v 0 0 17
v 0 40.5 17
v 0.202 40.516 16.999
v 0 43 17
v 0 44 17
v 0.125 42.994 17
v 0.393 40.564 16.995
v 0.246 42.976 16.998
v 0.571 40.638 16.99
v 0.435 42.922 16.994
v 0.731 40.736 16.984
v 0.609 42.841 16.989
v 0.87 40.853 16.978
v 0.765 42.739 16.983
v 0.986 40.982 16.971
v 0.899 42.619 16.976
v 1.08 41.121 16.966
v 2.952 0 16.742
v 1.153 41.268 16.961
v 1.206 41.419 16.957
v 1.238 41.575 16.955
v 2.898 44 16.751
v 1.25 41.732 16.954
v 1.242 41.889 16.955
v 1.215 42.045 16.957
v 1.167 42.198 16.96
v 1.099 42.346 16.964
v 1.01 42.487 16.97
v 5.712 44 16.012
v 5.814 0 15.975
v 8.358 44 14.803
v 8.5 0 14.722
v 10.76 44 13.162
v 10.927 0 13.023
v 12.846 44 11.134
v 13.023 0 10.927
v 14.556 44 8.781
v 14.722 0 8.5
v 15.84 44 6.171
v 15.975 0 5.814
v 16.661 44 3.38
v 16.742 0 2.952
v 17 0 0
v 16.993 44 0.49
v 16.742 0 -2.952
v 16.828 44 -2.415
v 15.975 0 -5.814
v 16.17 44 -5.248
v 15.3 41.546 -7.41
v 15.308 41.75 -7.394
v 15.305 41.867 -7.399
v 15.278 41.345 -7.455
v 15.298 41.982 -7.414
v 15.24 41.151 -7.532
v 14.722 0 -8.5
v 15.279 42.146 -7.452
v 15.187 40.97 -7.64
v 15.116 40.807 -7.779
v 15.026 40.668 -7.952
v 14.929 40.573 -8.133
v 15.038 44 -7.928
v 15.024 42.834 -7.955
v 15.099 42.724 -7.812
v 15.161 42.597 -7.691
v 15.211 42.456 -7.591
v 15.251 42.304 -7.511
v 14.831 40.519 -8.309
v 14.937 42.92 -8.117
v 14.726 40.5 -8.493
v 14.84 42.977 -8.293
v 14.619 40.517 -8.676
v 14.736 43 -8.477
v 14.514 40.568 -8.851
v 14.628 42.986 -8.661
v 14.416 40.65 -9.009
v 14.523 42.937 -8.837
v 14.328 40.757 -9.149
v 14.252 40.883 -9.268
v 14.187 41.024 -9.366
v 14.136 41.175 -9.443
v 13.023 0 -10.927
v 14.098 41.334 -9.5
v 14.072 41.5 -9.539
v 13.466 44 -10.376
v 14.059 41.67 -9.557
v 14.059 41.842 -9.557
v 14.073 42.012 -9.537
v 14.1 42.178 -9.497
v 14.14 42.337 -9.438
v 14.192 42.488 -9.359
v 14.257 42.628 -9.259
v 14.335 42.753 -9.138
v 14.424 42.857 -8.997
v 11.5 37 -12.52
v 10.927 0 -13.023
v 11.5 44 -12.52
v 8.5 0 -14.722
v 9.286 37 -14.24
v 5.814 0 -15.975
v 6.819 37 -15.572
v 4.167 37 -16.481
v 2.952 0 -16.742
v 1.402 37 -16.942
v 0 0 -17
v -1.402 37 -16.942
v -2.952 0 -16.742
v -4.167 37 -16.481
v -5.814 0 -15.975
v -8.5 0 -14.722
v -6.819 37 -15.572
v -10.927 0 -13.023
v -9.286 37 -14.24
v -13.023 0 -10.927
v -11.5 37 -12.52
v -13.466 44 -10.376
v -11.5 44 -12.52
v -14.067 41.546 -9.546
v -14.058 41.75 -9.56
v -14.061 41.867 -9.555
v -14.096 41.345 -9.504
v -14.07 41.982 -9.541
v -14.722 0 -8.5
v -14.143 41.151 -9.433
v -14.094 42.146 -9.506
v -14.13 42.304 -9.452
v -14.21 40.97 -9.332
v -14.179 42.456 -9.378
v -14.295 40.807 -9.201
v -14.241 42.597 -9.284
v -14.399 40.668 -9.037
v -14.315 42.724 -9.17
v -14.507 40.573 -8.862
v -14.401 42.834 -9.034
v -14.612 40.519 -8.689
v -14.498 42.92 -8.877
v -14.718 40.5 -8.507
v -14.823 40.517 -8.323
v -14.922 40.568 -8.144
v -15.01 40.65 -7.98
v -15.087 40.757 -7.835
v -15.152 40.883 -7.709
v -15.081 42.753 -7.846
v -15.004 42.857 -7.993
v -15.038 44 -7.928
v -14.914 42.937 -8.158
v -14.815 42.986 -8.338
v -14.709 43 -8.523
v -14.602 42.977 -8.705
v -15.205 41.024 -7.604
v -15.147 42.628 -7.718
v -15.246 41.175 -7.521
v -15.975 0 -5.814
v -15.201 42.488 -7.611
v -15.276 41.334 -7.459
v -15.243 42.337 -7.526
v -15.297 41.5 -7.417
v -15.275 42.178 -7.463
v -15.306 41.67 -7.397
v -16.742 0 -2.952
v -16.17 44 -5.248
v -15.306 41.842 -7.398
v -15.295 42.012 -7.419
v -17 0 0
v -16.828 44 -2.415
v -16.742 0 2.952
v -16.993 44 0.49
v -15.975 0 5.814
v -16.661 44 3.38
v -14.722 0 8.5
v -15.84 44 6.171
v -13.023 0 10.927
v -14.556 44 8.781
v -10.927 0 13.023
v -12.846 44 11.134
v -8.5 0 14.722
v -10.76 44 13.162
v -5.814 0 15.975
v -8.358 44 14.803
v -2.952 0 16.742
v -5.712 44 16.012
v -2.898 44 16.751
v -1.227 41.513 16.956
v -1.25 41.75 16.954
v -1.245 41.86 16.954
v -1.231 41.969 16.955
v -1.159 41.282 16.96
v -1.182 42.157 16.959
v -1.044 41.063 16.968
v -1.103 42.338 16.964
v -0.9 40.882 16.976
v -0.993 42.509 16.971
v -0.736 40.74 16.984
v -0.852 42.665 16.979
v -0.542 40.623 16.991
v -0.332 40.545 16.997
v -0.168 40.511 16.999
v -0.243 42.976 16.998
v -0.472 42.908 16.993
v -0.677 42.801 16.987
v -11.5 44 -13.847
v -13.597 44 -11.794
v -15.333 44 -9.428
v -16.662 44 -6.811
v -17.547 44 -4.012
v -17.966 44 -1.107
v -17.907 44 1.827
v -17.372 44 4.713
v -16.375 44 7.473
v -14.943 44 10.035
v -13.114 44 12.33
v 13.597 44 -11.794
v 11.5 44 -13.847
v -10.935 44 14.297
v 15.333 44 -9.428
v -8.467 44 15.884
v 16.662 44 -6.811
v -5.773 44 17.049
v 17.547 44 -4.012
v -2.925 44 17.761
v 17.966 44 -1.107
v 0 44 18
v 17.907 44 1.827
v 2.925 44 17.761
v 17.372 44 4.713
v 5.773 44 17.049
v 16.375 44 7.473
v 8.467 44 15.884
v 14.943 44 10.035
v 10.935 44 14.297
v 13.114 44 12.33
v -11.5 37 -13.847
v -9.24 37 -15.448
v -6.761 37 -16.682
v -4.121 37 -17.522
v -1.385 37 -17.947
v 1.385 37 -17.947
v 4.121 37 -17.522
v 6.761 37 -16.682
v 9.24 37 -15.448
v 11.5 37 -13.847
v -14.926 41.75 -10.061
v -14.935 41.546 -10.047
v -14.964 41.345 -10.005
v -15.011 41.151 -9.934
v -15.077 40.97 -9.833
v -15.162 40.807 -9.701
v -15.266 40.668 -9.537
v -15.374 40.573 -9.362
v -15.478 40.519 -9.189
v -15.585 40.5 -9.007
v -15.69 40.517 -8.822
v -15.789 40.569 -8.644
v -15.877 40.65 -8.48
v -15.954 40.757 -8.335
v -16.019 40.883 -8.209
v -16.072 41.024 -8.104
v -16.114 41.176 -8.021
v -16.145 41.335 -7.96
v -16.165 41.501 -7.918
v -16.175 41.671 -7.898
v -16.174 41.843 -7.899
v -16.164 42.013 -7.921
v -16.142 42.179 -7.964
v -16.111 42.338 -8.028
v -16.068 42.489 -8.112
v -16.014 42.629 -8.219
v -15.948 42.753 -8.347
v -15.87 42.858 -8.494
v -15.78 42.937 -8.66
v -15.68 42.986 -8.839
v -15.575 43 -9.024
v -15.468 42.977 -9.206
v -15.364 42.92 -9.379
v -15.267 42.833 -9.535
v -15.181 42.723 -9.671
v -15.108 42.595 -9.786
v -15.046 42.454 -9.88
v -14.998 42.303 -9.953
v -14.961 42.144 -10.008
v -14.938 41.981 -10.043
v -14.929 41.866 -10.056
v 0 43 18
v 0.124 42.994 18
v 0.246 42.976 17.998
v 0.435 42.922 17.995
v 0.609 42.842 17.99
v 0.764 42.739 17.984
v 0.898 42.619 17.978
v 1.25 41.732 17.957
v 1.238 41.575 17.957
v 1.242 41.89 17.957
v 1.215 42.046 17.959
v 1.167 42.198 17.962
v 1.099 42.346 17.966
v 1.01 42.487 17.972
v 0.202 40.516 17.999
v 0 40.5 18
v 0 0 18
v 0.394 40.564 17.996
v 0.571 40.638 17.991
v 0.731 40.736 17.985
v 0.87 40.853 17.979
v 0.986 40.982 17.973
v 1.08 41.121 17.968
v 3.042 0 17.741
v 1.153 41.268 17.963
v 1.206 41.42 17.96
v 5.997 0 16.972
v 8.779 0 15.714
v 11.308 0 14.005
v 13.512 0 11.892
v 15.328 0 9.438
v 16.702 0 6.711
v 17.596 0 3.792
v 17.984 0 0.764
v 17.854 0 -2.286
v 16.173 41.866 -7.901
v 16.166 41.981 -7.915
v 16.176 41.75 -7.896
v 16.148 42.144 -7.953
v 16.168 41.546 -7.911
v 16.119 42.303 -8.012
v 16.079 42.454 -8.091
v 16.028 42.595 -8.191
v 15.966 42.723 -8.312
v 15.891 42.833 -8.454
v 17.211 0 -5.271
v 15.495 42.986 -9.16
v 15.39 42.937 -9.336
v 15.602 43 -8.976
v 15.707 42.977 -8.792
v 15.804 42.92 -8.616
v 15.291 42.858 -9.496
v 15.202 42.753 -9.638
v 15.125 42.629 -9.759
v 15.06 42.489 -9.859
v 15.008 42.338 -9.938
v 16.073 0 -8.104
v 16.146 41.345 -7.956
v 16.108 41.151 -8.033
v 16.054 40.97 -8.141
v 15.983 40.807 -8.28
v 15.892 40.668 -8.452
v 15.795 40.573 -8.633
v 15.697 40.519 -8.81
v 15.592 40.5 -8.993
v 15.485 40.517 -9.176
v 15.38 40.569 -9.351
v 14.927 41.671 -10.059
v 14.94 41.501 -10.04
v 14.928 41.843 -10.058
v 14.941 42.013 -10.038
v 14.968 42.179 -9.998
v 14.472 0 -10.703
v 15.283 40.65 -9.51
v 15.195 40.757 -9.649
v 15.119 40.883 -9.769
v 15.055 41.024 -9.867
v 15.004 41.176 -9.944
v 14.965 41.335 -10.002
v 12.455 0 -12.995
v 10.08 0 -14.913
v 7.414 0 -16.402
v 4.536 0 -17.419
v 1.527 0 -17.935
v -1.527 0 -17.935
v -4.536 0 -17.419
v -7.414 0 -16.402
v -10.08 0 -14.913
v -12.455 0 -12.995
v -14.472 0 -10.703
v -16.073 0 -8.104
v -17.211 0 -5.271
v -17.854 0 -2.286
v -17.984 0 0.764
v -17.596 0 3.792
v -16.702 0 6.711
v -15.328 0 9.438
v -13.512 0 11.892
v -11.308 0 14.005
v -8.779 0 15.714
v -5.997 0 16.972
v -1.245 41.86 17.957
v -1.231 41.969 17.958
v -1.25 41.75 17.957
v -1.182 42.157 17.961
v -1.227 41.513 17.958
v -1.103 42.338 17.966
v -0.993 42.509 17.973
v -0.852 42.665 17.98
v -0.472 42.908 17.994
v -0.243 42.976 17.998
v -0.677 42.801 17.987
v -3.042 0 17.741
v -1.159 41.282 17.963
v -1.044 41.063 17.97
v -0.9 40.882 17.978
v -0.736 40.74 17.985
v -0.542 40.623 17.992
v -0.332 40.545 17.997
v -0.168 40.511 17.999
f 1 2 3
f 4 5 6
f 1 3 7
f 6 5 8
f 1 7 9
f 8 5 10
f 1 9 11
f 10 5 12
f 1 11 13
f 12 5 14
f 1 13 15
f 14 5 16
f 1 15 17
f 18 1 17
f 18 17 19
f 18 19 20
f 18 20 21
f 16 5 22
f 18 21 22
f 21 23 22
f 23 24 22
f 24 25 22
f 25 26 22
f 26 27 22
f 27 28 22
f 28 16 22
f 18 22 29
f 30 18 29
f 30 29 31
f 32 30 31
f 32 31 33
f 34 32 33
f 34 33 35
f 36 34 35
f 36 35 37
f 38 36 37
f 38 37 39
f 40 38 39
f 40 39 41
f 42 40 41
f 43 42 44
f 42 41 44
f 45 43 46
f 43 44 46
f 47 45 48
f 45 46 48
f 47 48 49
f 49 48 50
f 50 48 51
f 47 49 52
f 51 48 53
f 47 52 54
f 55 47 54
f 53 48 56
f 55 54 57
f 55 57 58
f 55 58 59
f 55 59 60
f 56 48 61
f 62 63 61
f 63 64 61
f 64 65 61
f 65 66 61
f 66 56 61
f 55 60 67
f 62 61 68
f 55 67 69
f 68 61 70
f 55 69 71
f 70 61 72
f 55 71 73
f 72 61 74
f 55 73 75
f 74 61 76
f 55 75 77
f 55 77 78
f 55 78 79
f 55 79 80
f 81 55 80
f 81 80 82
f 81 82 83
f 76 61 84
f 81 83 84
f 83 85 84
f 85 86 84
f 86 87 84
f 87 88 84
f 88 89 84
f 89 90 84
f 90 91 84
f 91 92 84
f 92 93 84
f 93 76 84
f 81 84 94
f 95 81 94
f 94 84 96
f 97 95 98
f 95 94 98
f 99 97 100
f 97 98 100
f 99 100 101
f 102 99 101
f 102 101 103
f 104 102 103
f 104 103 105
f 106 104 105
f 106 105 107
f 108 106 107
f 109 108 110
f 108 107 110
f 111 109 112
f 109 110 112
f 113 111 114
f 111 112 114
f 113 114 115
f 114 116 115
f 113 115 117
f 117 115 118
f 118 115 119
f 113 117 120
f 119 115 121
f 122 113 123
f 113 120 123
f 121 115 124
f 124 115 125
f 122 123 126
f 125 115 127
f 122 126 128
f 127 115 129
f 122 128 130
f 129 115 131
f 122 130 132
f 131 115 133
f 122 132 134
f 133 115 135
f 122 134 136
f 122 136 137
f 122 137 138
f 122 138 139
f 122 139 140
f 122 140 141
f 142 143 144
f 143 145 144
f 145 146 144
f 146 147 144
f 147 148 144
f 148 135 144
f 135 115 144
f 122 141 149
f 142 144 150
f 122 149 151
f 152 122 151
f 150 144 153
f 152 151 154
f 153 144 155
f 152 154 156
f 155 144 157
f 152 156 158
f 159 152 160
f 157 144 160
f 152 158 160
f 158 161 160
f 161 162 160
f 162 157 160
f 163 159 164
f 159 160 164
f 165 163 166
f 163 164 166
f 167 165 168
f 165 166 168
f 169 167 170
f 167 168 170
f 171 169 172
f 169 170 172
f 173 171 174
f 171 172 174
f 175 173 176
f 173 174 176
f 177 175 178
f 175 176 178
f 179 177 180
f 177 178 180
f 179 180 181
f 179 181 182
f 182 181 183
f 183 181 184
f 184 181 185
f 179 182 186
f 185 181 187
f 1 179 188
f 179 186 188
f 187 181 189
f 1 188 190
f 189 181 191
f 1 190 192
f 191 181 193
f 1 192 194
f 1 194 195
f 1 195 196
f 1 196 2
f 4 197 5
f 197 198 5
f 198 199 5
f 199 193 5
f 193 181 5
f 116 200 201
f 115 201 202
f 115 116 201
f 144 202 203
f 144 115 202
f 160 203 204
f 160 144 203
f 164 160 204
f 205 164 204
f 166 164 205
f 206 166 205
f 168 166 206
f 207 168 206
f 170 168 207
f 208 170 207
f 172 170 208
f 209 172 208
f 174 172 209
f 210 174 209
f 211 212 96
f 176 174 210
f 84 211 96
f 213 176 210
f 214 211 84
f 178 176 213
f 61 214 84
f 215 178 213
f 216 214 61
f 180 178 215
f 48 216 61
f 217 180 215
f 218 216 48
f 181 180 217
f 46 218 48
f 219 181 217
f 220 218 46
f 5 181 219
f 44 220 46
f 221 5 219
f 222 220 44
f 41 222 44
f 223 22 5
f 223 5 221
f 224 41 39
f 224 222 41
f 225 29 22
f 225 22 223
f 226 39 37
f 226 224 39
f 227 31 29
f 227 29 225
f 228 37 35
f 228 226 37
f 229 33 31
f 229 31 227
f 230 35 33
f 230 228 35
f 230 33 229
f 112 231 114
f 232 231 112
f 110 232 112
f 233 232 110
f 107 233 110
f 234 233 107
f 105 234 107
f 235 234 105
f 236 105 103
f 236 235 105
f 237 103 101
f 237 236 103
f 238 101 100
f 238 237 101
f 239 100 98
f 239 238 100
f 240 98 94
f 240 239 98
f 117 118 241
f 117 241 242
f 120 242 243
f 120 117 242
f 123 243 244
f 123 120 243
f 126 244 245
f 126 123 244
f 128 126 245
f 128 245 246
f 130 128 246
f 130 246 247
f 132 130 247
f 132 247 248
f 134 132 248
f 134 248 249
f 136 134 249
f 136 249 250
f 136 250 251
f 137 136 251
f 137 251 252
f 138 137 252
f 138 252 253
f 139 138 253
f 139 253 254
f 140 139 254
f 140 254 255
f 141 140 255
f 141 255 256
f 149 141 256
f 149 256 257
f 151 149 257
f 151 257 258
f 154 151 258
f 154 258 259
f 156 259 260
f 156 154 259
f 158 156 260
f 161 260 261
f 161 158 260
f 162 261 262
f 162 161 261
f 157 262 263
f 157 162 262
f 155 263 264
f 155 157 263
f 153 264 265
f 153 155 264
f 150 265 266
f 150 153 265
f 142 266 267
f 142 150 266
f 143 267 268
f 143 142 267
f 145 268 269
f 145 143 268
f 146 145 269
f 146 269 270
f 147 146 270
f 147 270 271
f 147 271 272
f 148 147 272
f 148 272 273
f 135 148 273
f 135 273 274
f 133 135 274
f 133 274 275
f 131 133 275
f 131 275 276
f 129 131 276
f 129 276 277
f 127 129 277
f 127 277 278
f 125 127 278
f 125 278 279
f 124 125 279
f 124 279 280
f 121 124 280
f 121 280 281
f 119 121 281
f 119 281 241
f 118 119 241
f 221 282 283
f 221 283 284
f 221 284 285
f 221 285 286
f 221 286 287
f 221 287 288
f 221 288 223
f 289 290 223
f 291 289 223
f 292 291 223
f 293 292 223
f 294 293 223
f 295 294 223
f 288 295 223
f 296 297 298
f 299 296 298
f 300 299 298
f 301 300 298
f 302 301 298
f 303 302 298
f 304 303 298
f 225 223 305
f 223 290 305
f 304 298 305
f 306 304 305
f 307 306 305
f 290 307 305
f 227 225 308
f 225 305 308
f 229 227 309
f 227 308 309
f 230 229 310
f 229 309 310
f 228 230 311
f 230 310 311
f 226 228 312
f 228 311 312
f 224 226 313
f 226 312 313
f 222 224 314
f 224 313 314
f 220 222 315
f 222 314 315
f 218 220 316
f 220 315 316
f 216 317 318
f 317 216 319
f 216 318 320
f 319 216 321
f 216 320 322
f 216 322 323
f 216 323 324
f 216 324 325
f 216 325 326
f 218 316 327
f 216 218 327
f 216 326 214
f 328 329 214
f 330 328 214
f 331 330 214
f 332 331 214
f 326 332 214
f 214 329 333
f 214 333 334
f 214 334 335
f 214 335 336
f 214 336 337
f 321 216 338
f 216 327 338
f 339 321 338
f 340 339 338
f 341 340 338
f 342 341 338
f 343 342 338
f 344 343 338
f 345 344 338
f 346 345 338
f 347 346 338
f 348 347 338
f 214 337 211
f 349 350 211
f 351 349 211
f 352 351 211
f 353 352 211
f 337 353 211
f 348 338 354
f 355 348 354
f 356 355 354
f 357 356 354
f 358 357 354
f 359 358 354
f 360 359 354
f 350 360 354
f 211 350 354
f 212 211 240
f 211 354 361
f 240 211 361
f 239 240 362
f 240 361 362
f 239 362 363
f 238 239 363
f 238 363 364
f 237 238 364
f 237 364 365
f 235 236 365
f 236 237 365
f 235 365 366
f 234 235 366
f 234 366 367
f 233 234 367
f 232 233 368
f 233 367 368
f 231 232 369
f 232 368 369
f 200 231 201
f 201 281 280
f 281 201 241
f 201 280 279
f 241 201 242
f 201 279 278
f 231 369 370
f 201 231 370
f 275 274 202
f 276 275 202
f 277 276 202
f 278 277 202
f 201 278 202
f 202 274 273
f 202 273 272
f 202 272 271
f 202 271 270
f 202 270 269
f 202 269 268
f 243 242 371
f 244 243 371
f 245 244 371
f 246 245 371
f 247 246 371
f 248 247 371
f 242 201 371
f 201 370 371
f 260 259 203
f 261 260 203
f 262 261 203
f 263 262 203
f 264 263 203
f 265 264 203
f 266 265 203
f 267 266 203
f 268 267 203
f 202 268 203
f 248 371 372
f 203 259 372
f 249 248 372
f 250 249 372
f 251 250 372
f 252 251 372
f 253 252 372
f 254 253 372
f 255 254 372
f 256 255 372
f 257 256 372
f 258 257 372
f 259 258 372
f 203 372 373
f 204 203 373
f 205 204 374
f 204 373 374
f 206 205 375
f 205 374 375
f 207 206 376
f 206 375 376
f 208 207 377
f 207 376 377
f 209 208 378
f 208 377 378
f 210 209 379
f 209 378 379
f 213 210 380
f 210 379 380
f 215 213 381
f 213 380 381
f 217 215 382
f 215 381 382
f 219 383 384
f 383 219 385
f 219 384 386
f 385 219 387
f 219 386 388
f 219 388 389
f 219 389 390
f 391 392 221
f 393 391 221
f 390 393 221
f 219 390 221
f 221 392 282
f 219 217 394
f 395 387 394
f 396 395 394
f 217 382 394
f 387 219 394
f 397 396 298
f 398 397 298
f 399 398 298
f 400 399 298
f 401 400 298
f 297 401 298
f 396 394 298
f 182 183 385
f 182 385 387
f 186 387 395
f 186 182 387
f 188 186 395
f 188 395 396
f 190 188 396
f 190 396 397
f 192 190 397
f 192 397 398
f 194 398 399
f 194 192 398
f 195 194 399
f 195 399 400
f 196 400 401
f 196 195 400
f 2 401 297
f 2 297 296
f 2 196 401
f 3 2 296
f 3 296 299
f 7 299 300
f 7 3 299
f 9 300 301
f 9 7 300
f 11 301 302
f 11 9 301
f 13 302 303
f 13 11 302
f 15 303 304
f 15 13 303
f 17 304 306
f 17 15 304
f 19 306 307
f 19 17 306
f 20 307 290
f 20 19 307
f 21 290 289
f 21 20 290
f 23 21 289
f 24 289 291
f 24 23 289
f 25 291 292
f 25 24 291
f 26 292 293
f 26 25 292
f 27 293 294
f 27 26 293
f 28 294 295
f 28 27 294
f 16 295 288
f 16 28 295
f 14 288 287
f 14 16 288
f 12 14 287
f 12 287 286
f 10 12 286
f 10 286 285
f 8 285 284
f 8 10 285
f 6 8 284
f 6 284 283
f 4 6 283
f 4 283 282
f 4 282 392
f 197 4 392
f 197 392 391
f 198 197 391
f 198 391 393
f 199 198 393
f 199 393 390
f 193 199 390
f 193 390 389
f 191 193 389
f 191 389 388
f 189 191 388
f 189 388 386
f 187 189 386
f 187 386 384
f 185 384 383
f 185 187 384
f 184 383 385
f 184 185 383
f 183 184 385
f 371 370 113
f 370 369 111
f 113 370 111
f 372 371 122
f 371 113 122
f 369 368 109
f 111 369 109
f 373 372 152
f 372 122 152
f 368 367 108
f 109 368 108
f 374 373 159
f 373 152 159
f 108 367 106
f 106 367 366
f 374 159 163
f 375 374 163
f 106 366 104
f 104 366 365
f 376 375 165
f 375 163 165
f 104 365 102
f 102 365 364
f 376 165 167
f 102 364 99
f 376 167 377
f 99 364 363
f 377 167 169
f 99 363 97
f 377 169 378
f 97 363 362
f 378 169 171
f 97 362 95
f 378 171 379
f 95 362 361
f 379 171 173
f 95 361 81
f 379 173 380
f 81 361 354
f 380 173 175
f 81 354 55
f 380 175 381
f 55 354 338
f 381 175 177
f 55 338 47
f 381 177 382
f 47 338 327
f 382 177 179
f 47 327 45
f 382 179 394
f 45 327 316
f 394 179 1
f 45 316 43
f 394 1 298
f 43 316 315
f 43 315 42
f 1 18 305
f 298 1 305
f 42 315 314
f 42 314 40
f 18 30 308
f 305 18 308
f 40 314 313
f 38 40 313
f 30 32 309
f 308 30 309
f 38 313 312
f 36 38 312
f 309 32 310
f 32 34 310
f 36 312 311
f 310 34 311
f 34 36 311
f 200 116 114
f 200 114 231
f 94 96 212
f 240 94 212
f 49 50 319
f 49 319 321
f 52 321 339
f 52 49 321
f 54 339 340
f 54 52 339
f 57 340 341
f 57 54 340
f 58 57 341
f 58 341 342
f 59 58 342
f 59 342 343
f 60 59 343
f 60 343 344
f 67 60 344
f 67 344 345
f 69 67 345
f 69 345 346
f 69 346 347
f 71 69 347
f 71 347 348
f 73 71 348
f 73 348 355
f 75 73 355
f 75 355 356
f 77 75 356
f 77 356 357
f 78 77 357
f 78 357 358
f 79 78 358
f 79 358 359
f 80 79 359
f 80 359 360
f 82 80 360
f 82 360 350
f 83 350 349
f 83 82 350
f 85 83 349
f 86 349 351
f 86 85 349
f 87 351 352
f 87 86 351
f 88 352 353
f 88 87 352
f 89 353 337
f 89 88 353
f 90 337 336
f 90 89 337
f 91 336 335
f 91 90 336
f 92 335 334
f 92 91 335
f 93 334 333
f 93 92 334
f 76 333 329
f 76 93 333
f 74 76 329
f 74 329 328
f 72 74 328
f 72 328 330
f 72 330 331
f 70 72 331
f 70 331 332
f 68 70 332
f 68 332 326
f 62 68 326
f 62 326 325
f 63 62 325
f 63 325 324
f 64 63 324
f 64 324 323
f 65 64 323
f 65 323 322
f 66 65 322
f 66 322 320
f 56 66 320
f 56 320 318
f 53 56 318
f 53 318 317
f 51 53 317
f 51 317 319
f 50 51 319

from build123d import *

# Parameters (mm, degrees)
SKETCH1_R           = 18
BOSS_EXTRUDE1_DEPTH = 44
SKETCH3_R           = 17
CUT_EXTRUDE2_DEPTH  = 51.833060109
SKETCH11_W          = 23
SKETCH11_H          = 15.641557415
CUT_EXTRUDE4_DEPTH  = 7
SKETCH13_R          = 1.25
CUT_EXTRUDE5_DEPTH  = 20
CIRPATTERN1_COUNT   = 3


with BuildPart() as part:
    # Sketch1 → Boss-Extrude1 (new body)
    with BuildSketch(Plane(origin=(0, 0, 0), x_dir=(1, 0, 0), z_dir=(0, 1, 0))):
        with Locations(Location((0, 0, 0), (0, 0, 270))):
            Circle(SKETCH1_R)
    extrude(amount=BOSS_EXTRUDE1_DEPTH)

    # Sketch3 → Cut-Extrude2 (cut, through all)
    with BuildSketch(Plane(origin=(0, 44, 0), x_dir=(1, 0, 0), z_dir=(0, 1, 0))):
        with Locations(Location((0, 0, 0), (0, 0, 270))):
            Circle(SKETCH3_R)
    extrude(amount=-CUT_EXTRUDE2_DEPTH, mode=Mode.SUBTRACT)

    # Sketch11 → Cut-Extrude4 (cut)
    with BuildSketch(Plane(origin=(0, 44, 0), x_dir=(1, 0, 0), z_dir=(0, 1, 0))):
        with Locations((0, 14.057671998)):
            Rectangle(SKETCH11_W, SKETCH11_H)
    extrude(amount=-CUT_EXTRUDE4_DEPTH, mode=Mode.SUBTRACT)

    # Sketch13 → Cut-Extrude5 (cut)
    with BuildSketch(Plane.XY):
        with Locations(Location((0, 41.75, 0), (0, 0, 180))):
            Circle(SKETCH13_R)
    cut_extrude5 = extrude(amount=CUT_EXTRUDE5_DEPTH, mode=Mode.SUBTRACT)

    # CirPattern1: Cut-Extrude5 ×3 about axis
    cirpattern1_axis = Axis((0, 0, 0), (0, 1, 0))
    for i in range(1, CIRPATTERN1_COUNT):
        add(cut_extrude5.rotate(cirpattern1_axis, i * 360 / CIRPATTERN1_COUNT), mode=Mode.SUBTRACT)


solid = part.part
